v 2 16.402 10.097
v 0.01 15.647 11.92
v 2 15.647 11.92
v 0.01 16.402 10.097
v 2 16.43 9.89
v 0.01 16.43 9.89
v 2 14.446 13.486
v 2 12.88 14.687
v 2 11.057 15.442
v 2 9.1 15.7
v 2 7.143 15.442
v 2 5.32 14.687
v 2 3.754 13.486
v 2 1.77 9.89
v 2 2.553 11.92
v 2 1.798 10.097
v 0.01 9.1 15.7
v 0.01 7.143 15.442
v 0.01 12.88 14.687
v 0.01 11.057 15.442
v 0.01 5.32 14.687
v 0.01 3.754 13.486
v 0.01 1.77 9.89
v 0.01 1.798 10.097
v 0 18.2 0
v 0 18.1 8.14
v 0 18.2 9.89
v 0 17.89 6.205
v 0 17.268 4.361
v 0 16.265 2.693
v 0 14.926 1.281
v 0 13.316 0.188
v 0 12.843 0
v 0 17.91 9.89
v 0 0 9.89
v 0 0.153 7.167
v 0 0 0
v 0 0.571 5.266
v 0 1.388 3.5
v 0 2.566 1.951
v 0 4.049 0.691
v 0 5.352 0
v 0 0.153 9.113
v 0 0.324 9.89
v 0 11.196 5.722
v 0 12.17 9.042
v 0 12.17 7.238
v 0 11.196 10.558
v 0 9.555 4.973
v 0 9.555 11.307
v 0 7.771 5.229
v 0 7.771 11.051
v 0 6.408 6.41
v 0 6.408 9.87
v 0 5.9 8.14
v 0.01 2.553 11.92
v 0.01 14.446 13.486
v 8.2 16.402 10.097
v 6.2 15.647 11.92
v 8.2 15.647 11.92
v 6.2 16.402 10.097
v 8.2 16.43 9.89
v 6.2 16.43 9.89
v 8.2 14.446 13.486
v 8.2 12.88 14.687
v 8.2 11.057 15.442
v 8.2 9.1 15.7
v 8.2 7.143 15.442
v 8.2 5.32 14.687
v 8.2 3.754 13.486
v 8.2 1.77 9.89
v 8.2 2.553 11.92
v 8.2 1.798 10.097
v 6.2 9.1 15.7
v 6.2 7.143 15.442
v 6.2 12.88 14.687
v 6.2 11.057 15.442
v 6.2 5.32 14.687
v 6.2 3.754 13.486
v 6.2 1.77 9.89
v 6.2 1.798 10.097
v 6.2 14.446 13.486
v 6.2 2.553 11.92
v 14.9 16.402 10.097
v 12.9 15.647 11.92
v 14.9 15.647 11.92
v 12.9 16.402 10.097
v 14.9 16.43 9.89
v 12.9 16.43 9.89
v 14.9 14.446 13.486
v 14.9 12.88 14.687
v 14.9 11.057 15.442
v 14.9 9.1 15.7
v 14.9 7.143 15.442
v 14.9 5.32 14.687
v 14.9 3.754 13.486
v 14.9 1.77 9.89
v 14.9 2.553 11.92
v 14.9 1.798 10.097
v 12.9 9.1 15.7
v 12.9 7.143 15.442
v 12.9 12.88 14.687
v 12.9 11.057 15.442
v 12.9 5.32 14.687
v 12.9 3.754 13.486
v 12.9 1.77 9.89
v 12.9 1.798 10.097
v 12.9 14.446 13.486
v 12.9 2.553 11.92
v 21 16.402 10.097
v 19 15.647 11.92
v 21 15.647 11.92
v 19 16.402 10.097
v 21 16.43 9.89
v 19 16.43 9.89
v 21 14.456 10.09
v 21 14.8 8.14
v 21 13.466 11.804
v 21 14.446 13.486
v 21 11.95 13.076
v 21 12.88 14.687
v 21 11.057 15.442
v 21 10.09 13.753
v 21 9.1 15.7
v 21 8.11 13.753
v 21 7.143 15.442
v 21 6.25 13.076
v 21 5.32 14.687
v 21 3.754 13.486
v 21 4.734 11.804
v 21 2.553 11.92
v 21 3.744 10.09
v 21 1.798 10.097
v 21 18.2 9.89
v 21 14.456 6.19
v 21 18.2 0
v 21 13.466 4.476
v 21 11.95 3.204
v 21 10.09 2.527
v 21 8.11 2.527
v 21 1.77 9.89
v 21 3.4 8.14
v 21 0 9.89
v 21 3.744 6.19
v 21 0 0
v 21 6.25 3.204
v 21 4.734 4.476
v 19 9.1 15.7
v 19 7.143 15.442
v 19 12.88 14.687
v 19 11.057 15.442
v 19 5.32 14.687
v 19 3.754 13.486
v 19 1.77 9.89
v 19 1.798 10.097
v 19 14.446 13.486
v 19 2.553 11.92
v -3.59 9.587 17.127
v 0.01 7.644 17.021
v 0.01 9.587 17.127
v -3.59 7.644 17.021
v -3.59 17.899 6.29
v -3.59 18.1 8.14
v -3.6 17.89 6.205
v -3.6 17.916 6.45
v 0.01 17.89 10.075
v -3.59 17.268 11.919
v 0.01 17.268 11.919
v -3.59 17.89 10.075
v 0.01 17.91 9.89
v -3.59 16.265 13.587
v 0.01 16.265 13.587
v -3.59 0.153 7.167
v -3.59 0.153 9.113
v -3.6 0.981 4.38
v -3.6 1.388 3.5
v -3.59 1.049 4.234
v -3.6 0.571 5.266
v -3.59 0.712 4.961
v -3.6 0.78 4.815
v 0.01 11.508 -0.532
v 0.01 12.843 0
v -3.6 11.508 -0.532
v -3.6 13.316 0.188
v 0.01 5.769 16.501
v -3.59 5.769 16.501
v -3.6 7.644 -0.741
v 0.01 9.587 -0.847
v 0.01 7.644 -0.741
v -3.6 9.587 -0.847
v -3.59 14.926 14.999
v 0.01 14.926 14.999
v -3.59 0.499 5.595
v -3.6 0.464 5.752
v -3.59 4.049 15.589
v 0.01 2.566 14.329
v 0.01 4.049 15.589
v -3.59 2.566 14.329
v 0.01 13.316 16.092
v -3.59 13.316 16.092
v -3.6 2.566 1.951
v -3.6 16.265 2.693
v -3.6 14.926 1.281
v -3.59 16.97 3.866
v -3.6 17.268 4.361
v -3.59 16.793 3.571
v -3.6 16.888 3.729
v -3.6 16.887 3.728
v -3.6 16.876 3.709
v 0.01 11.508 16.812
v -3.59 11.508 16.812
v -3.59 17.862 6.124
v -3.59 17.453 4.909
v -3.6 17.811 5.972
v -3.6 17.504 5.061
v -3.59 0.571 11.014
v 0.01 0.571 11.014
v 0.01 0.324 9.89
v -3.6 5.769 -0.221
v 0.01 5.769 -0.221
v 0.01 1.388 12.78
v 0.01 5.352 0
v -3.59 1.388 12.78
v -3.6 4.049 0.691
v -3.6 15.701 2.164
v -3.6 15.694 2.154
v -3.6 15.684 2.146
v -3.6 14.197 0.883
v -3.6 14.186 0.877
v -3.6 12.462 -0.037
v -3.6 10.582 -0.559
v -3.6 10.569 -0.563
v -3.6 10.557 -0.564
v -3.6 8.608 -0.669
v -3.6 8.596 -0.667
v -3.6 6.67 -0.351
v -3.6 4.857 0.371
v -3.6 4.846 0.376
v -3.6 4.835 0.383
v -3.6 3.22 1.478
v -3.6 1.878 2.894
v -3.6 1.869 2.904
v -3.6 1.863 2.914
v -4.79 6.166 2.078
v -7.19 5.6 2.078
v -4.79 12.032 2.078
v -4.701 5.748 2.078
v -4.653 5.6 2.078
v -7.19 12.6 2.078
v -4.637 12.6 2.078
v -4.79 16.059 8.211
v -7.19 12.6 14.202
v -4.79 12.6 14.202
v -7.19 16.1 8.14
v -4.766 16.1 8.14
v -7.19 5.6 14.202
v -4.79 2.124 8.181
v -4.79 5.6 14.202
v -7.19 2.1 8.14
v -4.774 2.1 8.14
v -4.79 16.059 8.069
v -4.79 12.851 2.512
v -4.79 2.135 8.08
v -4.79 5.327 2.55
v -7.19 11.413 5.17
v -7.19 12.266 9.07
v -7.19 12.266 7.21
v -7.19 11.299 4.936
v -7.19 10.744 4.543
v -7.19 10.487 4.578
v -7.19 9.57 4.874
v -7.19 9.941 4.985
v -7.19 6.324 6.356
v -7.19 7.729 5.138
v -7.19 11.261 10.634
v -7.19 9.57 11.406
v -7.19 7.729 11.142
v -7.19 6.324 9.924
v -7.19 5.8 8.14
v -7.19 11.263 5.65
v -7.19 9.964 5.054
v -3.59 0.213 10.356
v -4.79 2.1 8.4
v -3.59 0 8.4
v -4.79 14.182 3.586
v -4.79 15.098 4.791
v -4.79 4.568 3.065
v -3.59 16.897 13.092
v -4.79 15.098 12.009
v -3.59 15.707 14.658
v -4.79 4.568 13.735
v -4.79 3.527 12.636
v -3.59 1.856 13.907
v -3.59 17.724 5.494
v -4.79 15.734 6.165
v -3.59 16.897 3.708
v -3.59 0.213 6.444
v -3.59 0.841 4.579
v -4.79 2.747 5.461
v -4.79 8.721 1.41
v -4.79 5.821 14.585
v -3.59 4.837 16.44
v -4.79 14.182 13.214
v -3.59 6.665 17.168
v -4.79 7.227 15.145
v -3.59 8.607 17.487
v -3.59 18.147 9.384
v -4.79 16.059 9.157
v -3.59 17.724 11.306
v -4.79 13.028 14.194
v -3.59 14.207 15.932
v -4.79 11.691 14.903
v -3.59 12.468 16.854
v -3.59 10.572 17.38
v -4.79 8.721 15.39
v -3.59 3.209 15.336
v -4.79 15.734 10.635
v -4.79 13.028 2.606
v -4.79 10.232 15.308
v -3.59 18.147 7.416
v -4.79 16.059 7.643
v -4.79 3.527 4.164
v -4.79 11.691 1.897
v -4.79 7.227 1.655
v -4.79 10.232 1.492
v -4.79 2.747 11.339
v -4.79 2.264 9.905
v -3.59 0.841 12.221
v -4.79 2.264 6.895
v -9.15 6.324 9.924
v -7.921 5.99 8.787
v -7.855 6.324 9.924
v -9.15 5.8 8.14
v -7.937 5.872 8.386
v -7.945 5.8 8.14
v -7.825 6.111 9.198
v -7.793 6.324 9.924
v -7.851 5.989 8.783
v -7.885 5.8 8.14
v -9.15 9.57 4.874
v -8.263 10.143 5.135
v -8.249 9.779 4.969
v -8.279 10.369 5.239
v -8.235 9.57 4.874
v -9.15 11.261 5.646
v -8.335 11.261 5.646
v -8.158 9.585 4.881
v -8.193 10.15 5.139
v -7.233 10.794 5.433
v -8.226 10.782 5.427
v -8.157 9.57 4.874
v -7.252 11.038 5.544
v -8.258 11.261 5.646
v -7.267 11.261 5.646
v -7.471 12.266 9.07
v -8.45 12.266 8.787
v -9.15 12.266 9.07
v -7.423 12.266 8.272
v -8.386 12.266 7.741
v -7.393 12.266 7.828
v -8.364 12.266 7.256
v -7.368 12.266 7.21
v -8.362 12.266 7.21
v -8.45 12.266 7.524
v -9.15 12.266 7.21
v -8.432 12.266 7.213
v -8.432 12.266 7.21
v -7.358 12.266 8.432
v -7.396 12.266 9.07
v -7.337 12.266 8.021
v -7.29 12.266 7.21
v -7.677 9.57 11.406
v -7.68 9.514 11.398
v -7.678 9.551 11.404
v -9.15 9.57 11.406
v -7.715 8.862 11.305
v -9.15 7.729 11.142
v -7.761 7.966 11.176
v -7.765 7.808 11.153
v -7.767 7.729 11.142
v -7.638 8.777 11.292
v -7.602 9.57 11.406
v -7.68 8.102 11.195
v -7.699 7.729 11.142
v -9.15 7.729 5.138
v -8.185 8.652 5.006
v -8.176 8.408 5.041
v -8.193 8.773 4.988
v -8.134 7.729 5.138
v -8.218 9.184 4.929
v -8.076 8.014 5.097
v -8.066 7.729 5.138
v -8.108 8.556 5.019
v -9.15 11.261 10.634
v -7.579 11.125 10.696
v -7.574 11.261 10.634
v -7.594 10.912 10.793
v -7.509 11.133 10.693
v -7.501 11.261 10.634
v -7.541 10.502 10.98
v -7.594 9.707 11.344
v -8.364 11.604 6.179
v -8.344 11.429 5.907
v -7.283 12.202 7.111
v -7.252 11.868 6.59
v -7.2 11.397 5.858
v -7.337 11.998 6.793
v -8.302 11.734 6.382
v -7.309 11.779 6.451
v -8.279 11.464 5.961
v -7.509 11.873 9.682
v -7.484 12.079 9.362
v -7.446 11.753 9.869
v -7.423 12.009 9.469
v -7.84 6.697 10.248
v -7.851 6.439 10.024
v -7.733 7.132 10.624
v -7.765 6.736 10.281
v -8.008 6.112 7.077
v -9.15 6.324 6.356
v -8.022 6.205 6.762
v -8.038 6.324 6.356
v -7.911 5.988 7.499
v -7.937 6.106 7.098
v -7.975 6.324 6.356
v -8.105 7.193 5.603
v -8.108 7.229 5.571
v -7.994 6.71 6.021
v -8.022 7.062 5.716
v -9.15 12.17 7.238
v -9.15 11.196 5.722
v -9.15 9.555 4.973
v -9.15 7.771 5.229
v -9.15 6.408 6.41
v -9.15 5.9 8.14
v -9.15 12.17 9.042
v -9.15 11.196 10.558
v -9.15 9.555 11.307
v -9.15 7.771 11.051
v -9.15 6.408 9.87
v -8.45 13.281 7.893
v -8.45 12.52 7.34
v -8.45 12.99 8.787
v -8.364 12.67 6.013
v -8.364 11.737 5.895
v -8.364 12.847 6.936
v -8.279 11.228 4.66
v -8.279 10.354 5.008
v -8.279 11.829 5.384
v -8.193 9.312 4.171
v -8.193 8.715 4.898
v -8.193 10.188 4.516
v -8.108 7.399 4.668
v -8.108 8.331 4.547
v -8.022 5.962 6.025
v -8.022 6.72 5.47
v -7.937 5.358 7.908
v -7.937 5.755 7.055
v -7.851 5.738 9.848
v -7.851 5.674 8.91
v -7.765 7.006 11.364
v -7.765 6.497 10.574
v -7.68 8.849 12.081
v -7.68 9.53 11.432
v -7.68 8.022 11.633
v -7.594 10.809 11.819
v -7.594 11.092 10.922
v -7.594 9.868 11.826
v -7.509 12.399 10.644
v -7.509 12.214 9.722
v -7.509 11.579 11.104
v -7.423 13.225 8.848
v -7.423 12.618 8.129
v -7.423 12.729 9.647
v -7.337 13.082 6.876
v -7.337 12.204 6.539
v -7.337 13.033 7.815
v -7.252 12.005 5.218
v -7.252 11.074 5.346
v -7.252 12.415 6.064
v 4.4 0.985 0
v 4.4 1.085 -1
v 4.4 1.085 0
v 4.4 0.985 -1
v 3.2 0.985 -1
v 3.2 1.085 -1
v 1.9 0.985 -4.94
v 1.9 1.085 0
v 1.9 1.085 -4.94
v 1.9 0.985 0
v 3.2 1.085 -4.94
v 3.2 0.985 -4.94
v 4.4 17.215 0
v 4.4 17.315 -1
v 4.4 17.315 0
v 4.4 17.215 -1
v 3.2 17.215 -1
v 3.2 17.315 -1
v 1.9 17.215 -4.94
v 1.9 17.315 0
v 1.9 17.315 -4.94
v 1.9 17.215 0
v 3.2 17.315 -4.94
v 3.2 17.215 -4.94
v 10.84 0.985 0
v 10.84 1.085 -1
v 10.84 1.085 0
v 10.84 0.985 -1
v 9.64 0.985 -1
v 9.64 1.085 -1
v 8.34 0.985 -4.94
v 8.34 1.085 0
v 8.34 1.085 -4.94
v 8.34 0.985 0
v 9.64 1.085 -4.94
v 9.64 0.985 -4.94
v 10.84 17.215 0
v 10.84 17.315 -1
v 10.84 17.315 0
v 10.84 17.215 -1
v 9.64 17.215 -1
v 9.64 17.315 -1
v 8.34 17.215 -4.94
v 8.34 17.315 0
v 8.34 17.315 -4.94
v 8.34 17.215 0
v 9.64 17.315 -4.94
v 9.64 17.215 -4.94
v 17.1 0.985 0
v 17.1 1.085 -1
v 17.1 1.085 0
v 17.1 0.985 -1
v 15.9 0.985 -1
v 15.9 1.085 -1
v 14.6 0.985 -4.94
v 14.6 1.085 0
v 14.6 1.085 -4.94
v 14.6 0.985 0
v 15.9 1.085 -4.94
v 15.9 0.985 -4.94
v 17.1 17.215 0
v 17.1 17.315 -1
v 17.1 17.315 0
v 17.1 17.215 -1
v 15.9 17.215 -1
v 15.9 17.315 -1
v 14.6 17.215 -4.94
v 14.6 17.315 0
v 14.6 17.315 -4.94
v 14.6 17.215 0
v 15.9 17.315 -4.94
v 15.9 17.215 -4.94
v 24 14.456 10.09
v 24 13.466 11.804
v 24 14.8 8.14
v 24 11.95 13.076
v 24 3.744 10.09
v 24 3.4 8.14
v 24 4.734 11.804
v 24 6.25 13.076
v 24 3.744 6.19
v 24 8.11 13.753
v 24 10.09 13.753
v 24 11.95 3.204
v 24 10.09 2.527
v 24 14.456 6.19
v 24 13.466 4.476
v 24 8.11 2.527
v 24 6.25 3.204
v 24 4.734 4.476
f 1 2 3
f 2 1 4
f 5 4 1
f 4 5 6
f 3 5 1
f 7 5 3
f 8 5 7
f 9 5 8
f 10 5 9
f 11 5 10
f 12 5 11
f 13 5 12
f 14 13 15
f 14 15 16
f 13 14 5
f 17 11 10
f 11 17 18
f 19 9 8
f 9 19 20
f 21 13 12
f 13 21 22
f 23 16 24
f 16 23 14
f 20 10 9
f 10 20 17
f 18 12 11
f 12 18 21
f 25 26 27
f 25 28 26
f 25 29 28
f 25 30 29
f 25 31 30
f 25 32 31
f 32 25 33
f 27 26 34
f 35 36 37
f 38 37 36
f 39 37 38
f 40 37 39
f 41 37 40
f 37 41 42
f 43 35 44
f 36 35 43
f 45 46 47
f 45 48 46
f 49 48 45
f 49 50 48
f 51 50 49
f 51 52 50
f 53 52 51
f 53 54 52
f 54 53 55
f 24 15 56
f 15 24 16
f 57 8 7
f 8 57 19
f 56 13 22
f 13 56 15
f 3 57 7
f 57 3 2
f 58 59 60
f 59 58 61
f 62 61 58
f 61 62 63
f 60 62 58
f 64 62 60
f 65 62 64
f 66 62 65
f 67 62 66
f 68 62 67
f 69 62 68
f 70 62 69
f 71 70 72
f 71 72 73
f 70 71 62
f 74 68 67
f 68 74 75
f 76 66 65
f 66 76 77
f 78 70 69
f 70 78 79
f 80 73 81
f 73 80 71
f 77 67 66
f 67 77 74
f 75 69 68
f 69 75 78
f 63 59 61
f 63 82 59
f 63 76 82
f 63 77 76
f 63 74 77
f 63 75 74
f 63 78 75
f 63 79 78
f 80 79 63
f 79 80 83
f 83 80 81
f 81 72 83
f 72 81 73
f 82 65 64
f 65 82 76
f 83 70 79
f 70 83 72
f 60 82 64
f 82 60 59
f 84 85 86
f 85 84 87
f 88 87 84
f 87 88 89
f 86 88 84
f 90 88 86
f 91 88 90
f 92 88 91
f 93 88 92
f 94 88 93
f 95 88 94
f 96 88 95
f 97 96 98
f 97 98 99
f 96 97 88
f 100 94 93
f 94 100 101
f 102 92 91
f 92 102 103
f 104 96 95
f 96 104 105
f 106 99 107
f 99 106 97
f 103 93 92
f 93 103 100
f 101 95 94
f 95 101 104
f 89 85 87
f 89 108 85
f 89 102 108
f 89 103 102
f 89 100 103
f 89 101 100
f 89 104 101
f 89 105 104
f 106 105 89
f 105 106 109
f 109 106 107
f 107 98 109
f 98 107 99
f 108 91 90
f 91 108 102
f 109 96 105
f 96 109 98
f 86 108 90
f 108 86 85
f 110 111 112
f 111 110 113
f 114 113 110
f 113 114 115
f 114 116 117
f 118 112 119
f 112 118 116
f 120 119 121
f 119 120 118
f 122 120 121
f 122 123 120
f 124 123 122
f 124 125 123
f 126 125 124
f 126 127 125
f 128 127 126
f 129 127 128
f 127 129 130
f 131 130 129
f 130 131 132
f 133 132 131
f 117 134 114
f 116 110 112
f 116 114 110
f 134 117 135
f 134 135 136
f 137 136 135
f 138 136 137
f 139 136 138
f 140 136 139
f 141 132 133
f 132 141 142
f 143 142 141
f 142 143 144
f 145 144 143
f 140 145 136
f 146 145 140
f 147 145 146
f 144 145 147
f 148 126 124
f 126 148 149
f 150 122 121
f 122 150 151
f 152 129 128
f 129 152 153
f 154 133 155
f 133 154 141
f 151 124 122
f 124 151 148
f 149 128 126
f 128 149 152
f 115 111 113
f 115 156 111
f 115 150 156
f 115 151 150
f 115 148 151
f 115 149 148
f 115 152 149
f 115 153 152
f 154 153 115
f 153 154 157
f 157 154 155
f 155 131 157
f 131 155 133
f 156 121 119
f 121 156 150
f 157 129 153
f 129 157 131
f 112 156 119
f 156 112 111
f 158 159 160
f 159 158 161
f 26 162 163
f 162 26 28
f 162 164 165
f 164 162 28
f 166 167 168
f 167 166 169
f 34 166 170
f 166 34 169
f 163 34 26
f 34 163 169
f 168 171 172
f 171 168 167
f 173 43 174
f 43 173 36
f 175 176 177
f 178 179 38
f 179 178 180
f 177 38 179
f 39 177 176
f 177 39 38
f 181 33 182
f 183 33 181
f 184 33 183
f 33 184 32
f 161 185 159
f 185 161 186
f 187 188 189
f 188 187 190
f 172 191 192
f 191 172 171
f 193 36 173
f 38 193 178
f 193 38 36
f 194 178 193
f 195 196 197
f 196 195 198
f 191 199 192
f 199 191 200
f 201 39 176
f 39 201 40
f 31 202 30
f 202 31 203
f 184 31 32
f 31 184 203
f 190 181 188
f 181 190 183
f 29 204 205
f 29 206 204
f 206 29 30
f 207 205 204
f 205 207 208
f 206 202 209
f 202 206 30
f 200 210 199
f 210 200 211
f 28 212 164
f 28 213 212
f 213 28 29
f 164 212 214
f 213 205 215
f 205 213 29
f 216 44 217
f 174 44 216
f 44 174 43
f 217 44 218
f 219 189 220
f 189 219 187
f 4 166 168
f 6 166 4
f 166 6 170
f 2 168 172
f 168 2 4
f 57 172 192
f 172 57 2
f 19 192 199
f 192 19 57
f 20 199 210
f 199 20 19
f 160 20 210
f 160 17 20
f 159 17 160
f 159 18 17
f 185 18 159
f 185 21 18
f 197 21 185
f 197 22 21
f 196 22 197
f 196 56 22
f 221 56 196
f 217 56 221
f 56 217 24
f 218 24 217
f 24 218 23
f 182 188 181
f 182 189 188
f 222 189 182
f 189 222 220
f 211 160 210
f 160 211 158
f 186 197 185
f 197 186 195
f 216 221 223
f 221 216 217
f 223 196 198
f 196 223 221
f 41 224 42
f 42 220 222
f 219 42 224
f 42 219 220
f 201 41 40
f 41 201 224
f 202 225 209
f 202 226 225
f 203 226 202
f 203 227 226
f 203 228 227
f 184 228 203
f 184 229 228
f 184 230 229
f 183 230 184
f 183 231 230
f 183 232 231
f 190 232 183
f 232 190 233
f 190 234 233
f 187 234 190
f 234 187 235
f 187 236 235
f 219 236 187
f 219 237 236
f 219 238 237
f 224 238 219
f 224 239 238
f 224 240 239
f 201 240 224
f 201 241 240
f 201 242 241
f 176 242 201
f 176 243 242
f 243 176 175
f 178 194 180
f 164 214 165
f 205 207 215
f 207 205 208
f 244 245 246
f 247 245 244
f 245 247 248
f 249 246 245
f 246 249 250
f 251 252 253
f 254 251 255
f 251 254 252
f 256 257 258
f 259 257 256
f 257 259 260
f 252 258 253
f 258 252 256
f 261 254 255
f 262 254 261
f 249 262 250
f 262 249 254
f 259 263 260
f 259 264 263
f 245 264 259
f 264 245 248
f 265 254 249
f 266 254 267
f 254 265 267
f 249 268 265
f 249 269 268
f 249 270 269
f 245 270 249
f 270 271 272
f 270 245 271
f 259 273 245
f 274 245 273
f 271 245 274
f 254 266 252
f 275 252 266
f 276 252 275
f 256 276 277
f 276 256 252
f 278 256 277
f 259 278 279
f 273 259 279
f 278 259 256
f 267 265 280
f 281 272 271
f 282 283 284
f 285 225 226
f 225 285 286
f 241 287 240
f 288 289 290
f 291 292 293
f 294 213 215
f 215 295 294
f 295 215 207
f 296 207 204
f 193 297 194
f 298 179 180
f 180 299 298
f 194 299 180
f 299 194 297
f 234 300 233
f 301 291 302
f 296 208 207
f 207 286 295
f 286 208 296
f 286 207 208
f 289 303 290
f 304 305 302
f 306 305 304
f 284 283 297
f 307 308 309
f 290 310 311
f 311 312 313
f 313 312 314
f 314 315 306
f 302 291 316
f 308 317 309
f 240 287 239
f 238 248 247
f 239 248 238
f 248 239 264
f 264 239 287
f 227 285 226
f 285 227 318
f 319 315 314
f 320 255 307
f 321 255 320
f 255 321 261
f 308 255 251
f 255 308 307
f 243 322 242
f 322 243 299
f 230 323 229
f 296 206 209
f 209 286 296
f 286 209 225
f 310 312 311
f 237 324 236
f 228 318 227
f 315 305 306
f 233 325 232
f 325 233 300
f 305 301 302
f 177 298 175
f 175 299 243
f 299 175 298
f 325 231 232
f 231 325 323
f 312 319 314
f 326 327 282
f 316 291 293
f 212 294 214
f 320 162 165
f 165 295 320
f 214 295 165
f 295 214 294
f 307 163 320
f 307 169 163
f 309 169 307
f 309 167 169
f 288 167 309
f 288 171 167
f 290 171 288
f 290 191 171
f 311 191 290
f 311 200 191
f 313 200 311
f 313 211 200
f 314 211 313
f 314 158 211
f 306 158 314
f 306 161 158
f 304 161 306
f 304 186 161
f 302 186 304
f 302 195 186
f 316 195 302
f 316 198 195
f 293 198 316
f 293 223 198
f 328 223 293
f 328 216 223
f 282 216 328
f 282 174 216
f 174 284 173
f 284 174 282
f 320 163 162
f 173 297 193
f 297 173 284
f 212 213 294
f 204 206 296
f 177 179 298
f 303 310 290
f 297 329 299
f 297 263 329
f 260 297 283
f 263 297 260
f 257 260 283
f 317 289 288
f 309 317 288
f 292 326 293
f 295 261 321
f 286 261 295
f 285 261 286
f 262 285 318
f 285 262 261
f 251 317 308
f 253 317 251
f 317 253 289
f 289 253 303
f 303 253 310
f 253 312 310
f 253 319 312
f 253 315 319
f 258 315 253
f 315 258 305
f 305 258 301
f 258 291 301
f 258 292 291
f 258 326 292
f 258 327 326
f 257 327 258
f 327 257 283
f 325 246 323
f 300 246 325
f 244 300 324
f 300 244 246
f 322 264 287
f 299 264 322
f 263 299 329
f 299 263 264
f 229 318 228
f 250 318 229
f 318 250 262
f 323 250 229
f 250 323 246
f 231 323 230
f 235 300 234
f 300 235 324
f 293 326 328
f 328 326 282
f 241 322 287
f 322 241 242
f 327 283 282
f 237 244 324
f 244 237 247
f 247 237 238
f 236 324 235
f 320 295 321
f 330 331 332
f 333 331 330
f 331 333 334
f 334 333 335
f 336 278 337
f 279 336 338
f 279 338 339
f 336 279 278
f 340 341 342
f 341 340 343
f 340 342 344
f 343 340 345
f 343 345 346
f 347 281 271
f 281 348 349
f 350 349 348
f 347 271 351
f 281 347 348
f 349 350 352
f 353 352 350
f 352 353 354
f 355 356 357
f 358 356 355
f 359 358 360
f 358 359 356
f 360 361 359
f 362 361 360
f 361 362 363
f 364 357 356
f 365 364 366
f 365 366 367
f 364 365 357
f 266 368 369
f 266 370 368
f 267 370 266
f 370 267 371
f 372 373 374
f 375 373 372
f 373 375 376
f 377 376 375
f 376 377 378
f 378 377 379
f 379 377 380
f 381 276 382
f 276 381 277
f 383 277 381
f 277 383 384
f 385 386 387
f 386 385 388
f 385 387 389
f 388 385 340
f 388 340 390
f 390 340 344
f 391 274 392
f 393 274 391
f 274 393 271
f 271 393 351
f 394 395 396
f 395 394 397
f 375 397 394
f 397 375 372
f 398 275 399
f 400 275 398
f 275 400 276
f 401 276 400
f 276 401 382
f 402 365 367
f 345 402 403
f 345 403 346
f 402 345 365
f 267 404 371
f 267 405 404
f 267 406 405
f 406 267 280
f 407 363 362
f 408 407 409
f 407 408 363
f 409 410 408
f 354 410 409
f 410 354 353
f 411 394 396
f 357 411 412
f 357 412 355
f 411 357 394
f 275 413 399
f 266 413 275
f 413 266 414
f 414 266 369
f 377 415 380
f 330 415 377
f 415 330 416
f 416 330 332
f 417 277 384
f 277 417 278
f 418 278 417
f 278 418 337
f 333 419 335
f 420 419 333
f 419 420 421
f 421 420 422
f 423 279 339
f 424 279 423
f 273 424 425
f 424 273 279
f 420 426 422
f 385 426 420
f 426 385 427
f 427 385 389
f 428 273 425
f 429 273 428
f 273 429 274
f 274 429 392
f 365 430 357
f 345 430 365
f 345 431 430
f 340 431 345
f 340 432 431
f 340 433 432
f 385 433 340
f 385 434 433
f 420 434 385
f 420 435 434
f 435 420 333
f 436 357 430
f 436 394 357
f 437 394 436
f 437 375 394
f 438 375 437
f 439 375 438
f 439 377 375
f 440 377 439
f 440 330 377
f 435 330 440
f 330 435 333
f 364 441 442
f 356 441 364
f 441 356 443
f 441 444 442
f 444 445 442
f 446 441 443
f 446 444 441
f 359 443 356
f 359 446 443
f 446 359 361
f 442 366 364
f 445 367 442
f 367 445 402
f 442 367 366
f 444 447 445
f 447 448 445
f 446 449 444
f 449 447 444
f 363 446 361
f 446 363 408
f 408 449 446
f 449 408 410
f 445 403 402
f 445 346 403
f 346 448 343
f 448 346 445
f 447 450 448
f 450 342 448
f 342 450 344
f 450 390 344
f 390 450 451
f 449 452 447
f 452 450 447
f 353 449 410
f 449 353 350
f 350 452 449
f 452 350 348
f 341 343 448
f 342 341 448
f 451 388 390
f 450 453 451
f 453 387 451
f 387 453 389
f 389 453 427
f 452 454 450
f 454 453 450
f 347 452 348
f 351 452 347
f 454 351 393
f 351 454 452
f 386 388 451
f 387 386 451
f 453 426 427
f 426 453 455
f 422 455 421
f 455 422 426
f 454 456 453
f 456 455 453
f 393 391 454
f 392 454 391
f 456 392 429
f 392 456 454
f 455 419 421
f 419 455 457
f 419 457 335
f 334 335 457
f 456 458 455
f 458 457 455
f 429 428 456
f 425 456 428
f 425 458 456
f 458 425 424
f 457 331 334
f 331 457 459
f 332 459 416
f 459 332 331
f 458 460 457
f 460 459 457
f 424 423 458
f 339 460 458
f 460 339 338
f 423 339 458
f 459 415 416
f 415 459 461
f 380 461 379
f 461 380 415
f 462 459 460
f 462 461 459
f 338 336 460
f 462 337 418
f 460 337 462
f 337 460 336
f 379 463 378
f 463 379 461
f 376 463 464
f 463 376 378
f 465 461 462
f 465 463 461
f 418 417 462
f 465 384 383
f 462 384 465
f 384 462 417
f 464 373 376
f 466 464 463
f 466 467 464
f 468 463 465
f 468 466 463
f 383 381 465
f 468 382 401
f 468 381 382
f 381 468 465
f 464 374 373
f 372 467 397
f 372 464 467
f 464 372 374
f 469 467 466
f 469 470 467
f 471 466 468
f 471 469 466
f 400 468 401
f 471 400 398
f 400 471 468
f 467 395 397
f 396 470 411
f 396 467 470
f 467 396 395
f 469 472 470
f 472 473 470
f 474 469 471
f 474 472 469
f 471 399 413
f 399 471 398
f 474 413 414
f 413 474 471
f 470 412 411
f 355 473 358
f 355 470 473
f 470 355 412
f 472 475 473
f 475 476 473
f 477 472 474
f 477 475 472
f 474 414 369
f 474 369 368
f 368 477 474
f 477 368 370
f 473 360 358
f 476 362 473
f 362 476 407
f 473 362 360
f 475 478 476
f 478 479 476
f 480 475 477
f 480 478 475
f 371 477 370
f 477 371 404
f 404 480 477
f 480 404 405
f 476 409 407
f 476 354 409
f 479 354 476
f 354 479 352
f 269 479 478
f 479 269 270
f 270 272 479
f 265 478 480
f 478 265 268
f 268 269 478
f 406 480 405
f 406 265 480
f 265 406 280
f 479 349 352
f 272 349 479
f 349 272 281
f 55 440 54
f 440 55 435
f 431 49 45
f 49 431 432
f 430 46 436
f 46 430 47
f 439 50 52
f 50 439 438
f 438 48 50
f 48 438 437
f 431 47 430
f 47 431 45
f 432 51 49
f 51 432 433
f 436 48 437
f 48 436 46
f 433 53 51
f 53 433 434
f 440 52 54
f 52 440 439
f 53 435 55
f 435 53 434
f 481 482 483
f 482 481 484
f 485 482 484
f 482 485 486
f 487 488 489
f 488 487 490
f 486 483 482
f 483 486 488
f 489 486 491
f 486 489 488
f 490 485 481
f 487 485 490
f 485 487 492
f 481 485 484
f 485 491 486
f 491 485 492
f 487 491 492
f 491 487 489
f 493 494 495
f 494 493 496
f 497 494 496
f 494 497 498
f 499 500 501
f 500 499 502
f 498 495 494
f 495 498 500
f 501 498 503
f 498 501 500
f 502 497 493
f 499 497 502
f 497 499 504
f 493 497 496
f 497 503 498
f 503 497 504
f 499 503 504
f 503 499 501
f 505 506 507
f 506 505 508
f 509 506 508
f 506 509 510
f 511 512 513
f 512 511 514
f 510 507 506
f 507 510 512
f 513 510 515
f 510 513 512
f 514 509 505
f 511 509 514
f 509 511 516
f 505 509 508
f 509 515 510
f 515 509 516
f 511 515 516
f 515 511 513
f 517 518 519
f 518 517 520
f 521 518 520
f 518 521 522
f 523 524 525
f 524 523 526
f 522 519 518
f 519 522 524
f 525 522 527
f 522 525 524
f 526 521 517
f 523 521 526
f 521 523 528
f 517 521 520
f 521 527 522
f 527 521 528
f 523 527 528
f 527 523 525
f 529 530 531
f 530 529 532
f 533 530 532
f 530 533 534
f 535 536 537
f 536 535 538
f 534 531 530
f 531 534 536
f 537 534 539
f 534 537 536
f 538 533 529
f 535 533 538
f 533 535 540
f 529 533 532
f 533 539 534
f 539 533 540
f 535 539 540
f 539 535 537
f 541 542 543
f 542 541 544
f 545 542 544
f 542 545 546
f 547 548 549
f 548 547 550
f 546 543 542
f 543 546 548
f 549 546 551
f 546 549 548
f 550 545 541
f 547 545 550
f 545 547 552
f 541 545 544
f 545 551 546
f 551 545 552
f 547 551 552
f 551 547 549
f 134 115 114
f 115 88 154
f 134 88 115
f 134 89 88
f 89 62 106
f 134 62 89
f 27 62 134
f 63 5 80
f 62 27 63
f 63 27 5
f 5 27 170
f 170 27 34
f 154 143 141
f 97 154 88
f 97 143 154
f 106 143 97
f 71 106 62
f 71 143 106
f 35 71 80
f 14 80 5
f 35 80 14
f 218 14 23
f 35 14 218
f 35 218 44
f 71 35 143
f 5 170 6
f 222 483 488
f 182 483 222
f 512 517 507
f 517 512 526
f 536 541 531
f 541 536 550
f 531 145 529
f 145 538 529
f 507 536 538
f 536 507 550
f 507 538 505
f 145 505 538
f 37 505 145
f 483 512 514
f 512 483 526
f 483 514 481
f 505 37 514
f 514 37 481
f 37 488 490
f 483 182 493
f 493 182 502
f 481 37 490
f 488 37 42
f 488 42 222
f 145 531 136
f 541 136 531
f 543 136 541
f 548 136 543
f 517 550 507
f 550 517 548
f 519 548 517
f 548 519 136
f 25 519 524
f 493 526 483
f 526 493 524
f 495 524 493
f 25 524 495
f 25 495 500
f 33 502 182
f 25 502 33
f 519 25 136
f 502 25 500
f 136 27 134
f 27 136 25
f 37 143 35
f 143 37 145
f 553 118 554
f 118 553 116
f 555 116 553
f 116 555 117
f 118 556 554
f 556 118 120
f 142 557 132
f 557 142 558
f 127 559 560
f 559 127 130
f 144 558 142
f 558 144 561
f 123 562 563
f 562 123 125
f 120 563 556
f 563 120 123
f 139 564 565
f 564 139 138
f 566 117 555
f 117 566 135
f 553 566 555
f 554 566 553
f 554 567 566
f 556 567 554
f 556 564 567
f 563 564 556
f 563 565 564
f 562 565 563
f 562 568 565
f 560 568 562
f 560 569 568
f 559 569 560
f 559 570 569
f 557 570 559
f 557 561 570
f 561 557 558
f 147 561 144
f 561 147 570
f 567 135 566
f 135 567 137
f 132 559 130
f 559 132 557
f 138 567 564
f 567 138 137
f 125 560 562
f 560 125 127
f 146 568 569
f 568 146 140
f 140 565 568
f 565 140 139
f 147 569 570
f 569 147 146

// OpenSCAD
/* 2014 Don Bosley : 
Neutrik Jack Set V 0.0:
For updates/corrections email : don@bosleymusic.com
Mechanical Drawing
Compatible with Neutrik products : 
- stereo jack, switched, full threaded nose, offset PCB pins

NMJ6HFD3

*/
//MAIN BODY
translate([0,0,0])
color("black") 
cube([21,18.2,9.89]); 

//FRONT 

//BODY SECTIONS
for (i = [ [0,9.1,8.14],
		   [6.2,9.1,8.14],
		   [12.9,9.1,8.14],
		   [19,9.1,8.14],
])
{
	color("black")
	translate(i)
	rotate([90,0,90])
	cylinder(r=15.7-8.14, h=2); 
}

//REAR CYLINDER
color("black")
translate([20.9,9.1,8.14])
rotate([90,0,90]) 
cylinder(r=5.7,h=3.1);


difference(){
	union(){
		//NUT
		color("lightgrey")
		translate([-3.59, 9.1,8.14])
		rotate([90,0,-90])
		cylinder(r=7,h=3.6, $fn=6); 
		
//FRONT WASHERS
		for ( i = [ [-1.2,9.1,8.14], 
					[-2.4,9.1,8.14], 
					[-3.6,9.1,8.14], 
		])
		{	
			color("black")
			translate(i)
			rotate([90,0,90])
			cylinder(r=9, h=1.21); 
		}
//FRONT BEVEL 
		color("black")
		translate([-3.59, 9.1,8.4])
		rotate([90,0,-90])
		cylinder(r2=7, r1=9.1,h=1.2);
//MAIN SHAFT 
		color("black")
		translate([-.15, 9.1,8.14])
		rotate([90,0,-90])
		cylinder(r=3.3,h=9); 
//FRONT SCREW THREAD
		color("black")
		translate([-4, 15.75-6.43, 8.14])
		rotate([0,90,0])
		linear_extrude(height = 8.9, center = true, convexity = 10, twist = 3000)
		translate([0, 3.2, 1])
		circle(r = .8); 
	}
//NUTHOLE
color("black")
translate([8, 9.1,8.14])
rotate([90,0,-90])
cylinder(r=3.2,h=24); 
}


/*ENSURE PIN CENTERS ARE ALIGNED (COMMENT OUT)
for (i = [  [2.9,2.23/2,-4],//S
		   [2.9,18.2-2.23/2,-4],//SN
		   [15.6,2.23/2,-4],//T
		   [15.6,18.2-2.23/2,-4],//TN

 ])
{
	translate(i)
	color("blue")
	cylinder(r=.65, h=9);
}
*/
//PINS 
for(i = [
	     [2.55-.65,.985,-1],//S
		 [2.55-.65,18.2-.985,-1],//SN
		 [8.99-.65,.985,-1],//R
		 [8.99-.65,18.2-.985,-1],//RN
	     [15.25-.65,.985,-1],//T
		 [15.25-.65,18.2-.985,-1],//TN

])
{
	translate(i)
	color("lightgrey") 
	union(){
		cube([2.5,.1,9.1]);  
		translate([0,0,-3.94])
		cube([1.3,.1,3.96]);
	}
}
